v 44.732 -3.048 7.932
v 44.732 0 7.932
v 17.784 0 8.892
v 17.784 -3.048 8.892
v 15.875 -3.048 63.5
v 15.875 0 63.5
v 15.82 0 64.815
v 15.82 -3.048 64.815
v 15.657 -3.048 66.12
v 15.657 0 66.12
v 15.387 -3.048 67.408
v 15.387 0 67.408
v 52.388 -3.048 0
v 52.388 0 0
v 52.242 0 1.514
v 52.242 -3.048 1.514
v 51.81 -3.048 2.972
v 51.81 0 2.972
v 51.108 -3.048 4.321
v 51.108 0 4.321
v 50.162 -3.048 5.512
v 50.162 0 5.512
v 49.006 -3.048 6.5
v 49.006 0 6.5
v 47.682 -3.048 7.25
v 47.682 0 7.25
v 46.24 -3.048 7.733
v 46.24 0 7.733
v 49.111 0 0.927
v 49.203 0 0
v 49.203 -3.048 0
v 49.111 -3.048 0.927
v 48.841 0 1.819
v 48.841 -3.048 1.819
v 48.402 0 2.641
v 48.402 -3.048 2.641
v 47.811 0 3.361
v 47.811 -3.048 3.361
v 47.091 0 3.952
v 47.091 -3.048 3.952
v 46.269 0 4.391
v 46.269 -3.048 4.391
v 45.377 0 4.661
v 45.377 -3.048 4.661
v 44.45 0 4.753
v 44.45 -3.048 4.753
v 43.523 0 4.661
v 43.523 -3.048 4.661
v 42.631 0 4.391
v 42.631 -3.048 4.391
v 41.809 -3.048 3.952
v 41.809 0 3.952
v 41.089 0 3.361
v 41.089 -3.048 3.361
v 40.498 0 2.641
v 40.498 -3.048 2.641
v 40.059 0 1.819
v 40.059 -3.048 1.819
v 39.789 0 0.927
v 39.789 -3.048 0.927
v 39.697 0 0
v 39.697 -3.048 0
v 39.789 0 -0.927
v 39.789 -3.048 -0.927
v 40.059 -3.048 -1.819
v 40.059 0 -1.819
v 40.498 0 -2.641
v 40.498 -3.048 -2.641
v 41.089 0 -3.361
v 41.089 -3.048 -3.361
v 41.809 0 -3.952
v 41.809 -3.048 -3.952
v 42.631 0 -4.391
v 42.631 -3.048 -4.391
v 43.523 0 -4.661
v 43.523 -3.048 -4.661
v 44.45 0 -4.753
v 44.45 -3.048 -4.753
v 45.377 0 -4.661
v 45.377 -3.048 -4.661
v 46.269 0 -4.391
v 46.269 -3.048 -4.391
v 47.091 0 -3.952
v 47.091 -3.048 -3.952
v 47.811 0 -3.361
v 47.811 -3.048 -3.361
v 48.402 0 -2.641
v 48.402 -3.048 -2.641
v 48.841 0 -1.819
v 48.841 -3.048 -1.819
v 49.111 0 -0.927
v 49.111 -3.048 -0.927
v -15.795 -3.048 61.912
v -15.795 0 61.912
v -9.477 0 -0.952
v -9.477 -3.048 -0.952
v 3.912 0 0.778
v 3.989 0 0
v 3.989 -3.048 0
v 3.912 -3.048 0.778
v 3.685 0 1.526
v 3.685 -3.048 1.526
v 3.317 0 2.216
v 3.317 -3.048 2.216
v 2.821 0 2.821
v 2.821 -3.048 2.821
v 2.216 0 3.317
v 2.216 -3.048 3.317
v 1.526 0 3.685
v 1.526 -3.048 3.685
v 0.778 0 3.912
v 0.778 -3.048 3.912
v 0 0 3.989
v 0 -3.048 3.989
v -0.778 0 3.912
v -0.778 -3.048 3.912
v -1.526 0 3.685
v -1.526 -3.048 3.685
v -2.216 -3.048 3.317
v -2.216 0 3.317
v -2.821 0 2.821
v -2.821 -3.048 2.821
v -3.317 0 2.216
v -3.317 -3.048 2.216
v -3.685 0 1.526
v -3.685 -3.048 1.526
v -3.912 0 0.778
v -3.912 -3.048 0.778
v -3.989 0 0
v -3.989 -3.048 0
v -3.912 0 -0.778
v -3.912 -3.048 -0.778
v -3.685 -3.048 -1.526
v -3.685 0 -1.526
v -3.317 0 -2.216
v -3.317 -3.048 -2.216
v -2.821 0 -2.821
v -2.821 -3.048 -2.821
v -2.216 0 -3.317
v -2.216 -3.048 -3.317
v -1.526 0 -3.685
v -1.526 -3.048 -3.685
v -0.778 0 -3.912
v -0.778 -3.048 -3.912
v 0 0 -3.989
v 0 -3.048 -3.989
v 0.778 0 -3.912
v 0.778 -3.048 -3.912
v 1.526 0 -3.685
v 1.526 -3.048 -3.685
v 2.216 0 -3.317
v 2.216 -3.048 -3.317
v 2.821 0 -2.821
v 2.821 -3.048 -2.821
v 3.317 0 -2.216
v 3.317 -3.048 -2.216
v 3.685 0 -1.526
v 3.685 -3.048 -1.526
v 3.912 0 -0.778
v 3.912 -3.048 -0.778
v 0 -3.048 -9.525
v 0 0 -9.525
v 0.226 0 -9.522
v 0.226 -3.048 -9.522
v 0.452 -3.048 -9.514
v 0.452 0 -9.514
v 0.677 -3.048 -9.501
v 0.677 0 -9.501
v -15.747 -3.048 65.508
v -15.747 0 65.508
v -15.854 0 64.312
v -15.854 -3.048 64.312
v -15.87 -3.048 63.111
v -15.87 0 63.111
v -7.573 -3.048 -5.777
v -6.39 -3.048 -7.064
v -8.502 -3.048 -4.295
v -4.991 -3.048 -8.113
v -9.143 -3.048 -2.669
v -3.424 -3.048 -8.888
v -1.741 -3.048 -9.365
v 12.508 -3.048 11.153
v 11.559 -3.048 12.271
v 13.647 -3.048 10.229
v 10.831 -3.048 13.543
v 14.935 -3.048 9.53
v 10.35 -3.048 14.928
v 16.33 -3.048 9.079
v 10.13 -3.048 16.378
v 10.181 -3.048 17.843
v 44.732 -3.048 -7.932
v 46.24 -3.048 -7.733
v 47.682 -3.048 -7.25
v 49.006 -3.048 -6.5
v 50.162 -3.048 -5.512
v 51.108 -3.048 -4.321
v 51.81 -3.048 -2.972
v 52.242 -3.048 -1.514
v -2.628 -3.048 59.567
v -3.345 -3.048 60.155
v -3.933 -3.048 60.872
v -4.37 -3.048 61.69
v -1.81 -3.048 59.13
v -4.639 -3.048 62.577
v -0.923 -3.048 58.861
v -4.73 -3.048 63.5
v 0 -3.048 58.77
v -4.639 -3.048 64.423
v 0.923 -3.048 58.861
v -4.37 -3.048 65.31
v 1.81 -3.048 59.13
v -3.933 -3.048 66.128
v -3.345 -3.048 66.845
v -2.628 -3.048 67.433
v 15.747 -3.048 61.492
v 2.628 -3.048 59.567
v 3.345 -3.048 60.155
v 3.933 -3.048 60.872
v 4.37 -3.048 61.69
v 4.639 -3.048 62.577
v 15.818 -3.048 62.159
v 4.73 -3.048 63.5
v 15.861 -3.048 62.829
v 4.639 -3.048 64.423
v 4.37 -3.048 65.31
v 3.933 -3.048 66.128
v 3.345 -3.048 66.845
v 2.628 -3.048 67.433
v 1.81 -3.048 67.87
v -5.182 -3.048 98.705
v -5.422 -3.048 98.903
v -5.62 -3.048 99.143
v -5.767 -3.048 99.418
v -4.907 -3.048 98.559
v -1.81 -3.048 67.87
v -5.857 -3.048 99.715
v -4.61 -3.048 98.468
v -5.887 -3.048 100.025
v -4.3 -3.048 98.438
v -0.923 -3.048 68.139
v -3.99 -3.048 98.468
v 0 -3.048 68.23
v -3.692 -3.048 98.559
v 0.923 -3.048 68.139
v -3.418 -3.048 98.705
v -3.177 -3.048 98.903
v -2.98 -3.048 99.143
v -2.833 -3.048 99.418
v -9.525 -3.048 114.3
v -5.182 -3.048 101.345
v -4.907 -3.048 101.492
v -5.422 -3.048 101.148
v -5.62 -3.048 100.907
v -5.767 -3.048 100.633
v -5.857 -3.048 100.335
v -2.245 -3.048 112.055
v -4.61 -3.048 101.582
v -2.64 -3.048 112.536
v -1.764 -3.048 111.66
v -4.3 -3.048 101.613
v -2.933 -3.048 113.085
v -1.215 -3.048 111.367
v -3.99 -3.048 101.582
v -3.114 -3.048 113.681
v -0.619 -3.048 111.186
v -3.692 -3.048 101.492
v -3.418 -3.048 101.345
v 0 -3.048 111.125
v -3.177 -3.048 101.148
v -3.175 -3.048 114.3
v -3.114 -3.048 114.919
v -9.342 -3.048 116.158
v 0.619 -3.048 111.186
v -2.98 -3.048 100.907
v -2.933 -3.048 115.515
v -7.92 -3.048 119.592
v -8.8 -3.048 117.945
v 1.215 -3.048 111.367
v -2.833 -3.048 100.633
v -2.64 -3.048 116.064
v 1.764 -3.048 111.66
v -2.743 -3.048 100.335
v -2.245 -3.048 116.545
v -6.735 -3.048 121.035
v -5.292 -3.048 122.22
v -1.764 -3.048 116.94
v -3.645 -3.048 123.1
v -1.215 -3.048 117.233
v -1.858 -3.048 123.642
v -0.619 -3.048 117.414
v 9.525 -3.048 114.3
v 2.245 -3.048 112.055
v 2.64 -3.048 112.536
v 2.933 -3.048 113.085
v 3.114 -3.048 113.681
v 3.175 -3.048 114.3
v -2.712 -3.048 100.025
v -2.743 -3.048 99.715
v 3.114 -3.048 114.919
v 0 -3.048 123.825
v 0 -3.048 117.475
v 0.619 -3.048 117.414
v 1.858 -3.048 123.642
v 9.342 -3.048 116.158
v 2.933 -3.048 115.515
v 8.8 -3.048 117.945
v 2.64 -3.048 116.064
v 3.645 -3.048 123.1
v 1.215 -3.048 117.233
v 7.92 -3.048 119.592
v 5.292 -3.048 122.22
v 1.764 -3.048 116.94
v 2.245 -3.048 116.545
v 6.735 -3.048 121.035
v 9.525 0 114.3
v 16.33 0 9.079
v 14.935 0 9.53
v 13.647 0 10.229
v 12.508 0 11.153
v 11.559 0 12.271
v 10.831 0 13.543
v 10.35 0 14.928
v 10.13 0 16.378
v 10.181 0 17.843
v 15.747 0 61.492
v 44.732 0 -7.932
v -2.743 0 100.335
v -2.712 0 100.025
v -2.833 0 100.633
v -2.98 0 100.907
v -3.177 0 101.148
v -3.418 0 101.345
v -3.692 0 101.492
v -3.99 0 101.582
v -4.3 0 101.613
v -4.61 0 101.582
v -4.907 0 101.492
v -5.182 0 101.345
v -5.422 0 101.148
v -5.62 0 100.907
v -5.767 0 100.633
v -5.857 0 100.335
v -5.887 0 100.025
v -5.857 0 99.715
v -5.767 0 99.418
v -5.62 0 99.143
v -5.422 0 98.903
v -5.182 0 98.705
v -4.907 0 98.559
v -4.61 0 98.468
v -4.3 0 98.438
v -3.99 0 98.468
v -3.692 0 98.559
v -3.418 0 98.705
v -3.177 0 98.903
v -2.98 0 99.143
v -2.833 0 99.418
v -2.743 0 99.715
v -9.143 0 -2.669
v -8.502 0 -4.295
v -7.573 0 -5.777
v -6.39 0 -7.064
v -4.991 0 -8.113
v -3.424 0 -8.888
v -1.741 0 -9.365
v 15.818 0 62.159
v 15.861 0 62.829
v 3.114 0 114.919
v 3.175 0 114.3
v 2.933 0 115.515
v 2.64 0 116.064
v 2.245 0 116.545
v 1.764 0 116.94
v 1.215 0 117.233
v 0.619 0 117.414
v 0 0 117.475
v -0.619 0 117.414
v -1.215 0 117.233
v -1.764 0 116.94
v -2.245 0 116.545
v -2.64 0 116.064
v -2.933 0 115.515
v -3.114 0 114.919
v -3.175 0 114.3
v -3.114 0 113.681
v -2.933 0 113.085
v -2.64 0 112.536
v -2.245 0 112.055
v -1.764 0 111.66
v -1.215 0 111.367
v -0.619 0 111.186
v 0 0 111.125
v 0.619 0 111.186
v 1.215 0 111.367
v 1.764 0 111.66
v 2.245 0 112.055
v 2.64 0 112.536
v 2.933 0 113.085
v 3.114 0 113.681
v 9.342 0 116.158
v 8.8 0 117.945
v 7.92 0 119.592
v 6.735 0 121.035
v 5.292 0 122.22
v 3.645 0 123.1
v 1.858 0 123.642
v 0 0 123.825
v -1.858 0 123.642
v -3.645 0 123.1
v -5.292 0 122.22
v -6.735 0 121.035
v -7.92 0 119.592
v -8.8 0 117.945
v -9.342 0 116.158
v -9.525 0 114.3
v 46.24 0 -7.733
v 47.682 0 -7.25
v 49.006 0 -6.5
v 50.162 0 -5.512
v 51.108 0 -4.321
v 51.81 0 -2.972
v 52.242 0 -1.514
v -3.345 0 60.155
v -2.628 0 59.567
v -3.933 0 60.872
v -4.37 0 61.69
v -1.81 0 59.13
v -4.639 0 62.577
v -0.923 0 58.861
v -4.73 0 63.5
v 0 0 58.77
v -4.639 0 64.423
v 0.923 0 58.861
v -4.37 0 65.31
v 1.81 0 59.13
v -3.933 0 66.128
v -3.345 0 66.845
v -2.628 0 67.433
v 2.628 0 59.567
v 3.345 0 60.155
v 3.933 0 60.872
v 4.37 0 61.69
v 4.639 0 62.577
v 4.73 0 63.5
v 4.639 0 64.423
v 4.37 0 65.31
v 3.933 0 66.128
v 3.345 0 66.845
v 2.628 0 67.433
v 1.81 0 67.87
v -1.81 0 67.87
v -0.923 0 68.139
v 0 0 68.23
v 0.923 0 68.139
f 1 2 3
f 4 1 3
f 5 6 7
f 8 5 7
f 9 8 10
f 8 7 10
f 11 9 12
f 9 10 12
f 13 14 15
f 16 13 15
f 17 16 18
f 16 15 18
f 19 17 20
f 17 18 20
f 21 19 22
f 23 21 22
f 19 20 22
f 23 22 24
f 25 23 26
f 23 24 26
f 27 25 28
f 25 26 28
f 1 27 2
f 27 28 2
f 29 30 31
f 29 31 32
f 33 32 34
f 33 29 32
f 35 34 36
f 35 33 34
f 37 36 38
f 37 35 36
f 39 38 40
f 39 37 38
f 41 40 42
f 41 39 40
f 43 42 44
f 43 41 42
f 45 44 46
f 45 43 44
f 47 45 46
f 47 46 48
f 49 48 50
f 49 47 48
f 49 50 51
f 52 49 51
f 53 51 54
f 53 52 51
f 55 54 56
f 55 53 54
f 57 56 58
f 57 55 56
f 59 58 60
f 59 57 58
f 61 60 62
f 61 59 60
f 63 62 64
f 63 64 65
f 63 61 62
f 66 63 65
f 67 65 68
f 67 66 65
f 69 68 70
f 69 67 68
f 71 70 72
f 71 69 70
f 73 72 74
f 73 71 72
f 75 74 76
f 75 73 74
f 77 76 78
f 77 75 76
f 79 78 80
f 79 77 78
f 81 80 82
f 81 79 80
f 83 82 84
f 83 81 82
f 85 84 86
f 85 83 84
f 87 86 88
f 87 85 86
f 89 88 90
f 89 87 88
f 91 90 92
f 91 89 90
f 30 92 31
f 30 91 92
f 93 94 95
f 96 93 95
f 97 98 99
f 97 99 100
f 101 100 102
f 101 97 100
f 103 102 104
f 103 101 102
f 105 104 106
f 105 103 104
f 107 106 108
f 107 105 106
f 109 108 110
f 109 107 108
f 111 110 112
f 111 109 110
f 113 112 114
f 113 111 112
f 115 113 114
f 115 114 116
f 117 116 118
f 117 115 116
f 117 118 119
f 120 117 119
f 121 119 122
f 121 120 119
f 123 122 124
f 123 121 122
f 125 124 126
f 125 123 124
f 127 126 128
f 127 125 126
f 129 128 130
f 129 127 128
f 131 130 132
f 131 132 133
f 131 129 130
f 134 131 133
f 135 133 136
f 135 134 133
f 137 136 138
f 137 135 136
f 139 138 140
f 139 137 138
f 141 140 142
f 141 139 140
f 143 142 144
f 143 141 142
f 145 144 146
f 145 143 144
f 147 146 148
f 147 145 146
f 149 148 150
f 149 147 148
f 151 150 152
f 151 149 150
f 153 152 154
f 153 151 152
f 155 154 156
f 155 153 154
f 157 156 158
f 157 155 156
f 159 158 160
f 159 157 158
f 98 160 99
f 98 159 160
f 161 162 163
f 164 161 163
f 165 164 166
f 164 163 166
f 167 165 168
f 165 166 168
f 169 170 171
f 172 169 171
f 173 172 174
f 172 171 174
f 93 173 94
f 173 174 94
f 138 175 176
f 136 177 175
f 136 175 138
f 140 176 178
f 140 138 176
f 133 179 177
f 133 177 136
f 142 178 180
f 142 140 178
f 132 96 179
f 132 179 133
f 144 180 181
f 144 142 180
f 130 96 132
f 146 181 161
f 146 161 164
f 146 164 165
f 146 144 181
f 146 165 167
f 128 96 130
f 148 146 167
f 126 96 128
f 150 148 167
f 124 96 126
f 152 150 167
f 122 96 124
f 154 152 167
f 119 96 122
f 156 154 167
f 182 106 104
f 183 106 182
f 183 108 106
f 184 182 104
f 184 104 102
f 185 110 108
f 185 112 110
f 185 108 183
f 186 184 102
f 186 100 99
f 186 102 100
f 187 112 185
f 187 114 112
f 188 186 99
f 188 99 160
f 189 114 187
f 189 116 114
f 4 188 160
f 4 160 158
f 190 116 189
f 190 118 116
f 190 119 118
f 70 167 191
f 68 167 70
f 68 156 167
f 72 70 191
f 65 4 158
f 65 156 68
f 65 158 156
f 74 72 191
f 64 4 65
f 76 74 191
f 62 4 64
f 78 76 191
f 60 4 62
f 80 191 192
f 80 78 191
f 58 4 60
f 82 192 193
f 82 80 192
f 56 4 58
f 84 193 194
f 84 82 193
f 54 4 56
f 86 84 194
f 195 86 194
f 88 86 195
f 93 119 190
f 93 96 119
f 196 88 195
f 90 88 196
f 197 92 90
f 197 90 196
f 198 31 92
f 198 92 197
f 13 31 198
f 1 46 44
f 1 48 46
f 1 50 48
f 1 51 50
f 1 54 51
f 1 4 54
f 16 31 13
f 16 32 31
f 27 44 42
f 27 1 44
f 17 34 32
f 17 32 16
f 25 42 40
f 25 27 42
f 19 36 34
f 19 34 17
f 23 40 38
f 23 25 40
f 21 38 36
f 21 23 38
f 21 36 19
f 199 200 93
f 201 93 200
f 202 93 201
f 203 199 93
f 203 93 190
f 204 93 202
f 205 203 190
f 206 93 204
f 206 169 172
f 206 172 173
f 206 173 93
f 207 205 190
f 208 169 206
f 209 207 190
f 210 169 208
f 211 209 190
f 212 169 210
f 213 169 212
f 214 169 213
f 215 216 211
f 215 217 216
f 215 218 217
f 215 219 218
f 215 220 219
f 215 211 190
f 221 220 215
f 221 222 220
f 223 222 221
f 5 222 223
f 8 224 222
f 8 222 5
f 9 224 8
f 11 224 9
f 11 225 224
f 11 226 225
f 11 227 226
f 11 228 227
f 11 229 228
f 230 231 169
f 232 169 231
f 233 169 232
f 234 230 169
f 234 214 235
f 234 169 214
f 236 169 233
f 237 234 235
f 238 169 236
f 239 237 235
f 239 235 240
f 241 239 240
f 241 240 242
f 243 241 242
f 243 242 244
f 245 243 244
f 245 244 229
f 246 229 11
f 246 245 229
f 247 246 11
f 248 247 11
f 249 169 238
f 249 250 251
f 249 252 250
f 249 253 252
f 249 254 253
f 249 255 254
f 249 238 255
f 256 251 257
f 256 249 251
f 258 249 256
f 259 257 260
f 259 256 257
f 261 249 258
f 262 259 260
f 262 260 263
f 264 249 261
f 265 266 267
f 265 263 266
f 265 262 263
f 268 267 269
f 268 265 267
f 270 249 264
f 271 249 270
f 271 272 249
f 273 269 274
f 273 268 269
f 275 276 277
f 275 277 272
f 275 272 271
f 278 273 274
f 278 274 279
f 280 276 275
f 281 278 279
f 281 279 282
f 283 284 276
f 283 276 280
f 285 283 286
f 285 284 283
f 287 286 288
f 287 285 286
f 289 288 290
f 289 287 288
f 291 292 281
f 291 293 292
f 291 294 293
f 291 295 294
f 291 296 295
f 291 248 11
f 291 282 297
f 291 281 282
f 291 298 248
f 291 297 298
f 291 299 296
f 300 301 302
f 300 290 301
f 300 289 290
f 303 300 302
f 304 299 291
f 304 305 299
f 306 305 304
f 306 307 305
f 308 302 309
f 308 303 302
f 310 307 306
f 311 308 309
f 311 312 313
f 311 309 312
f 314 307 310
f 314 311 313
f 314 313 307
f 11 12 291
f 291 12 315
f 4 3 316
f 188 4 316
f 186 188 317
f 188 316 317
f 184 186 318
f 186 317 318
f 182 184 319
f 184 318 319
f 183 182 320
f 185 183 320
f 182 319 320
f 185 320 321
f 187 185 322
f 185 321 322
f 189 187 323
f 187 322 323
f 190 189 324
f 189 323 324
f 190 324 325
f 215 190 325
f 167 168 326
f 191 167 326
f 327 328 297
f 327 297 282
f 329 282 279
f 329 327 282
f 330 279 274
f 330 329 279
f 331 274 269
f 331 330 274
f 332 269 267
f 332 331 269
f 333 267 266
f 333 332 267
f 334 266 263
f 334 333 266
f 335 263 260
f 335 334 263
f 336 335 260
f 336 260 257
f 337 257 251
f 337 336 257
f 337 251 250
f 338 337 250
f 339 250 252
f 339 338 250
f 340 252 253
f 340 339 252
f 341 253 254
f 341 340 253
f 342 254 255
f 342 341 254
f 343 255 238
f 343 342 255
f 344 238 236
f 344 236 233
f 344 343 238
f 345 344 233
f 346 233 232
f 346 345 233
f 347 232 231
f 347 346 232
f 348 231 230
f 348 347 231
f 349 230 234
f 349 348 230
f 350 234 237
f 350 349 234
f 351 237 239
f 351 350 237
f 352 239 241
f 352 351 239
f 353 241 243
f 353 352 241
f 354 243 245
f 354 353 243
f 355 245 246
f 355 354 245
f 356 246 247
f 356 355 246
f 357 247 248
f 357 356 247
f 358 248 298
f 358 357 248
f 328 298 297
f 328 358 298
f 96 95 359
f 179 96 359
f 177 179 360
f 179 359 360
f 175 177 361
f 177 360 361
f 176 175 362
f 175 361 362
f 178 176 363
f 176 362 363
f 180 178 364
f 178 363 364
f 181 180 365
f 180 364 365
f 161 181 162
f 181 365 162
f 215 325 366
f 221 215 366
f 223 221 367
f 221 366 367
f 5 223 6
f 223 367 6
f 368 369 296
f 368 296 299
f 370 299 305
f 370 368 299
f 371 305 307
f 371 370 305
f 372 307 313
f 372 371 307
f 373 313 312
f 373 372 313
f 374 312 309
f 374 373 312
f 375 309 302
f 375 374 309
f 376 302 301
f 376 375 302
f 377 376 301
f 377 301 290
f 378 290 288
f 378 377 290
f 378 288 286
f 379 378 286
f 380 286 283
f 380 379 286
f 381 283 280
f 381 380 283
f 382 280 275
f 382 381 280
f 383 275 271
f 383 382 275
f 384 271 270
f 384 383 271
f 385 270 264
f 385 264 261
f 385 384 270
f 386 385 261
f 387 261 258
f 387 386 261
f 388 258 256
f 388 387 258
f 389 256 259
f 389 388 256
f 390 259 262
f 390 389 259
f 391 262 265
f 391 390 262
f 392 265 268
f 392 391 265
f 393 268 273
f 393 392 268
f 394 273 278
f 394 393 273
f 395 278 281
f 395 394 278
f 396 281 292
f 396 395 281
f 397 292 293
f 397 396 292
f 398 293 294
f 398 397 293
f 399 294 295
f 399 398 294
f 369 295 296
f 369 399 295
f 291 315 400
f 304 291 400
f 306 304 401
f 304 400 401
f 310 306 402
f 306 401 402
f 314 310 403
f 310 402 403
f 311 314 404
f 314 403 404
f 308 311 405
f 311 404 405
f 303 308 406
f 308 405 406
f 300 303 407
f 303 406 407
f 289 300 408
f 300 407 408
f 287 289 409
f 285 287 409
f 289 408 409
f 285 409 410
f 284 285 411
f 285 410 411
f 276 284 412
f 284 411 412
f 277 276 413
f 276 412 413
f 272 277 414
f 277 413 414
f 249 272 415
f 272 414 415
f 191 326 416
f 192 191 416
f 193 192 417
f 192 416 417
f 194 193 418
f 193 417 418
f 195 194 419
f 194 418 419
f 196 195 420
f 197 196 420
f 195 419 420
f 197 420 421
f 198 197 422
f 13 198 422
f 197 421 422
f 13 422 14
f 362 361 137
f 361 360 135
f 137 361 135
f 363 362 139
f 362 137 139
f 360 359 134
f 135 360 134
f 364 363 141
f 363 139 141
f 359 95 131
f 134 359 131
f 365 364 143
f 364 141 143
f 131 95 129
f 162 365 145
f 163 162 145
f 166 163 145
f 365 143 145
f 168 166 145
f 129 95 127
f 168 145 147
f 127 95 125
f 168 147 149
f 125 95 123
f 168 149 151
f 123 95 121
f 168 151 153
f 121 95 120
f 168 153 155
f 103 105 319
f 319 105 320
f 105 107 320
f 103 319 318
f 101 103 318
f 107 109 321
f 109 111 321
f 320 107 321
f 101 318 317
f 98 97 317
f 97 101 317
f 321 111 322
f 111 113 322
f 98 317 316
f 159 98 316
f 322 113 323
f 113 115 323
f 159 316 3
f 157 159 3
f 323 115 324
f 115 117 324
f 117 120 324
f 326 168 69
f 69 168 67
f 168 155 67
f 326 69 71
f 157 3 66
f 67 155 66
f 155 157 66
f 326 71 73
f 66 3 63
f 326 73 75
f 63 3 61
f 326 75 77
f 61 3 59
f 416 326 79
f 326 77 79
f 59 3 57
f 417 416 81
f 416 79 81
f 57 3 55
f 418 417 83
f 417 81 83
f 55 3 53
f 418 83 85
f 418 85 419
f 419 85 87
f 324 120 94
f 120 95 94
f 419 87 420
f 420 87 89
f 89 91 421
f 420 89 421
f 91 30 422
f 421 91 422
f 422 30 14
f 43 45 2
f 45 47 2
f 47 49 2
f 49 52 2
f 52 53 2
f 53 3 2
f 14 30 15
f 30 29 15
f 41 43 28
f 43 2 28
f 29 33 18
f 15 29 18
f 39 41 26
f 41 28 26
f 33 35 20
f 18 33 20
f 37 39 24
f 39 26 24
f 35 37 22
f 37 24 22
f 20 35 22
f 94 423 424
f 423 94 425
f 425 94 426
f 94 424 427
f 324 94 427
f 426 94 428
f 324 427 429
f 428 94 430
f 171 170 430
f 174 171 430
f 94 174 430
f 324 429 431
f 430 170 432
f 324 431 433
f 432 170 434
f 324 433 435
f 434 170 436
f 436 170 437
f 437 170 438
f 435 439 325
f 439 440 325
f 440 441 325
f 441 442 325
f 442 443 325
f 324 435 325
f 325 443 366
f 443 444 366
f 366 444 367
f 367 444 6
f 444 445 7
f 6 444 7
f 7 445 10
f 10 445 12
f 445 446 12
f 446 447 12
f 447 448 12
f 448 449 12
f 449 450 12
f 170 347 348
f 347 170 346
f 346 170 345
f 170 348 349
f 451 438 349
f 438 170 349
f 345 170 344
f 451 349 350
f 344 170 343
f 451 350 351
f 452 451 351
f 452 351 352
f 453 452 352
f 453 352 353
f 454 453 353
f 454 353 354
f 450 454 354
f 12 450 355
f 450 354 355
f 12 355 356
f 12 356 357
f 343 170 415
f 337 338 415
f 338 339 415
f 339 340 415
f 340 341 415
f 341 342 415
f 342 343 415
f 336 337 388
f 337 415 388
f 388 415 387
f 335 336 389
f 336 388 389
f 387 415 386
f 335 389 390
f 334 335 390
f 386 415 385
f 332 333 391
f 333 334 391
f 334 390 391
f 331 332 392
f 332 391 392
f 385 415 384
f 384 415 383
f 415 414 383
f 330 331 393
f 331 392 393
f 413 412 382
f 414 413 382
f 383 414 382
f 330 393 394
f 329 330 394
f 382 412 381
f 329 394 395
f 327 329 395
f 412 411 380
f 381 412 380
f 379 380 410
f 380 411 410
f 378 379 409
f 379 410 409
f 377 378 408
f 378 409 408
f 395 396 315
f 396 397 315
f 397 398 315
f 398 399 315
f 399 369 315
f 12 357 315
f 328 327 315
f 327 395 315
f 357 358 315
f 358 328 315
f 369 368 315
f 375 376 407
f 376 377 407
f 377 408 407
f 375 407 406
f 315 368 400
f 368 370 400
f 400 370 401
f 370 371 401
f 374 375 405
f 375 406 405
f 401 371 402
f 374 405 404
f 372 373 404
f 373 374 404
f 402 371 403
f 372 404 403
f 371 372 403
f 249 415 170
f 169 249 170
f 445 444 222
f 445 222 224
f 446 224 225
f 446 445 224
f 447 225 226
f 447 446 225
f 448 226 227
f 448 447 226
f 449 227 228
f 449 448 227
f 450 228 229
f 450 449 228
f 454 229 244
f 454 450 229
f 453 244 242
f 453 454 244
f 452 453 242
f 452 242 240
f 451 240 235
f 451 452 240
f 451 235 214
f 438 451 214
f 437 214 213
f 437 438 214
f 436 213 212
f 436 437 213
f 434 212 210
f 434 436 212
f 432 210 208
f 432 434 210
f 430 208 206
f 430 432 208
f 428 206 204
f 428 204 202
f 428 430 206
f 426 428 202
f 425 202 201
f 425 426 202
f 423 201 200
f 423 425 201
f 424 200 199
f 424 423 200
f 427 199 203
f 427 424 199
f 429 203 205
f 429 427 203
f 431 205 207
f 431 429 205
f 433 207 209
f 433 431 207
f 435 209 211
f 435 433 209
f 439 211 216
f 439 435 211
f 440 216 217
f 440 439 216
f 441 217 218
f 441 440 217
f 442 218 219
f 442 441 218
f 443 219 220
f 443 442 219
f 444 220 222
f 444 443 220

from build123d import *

# Parameters (mm, degrees)
F0_R     = 3.175
F0_R_2   = 1.5875
F0_R_3   = 4.729967
F0_R_4   = 3.988899
F0_R_5   = 4.752778
F1_DEPTH = 3.048


with BuildPart() as f1:
    # F0 (on Front) → F1 (new body)
    with BuildSketch(Plane.XZ):
        with BuildLine():
            ThreePointArc((-9.525, 114.3), (0, 104.775), (9.525, 114.3))
            ThreePointArc((9.525, 114.3), (0, 123.825), (-9.525, 114.3))
        make_face()
        with Locations((0, 114.3)):
            Circle(F0_R, mode=Mode.SUBTRACT)
        with BuildLine():
            Line((15.386538, 67.407692), (9.525, 114.3))
            ThreePointArc((9.525, 114.3), (0, 104.775), (-9.525, 114.3))
            Line((-9.525, 114.3), (-15.747457, 65.508289))
            ThreePointArc((-15.747457, 65.508289), (-0.966695, 79.34554), (15.386538, 67.407692))
        make_face()
        with Locations((-4.299854, 100.0252)):
            Circle(F0_R_2, mode=Mode.SUBTRACT)
        with BuildLine():
            Line((15.875, 63.5), (15.386538, 67.407692))
            ThreePointArc((15.386538, 67.407692), (-0.966695, 79.34554), (-15.747457, 65.508289))
            ThreePointArc((-15.747457, 65.508289), (-15.873588, 63.711757), (-15.795426, 61.9125))
            ThreePointArc((-15.795426, 61.9125), (-0.211757, 47.626412), (15.747457, 61.491711))
            ThreePointArc((15.747457, 61.491711), (15.843082, 62.493832), (15.875, 63.5))
        make_face()
        with Locations((0, 63.5)):
            Circle(F0_R_3, mode=Mode.SUBTRACT)
        with BuildLine():
            ThreePointArc((15.875, 63.5), (15.752411, 65.469051), (15.386538, 67.407692))
            Line((15.386538, 67.407692), (15.875, 63.5))
        make_face()
        with BuildLine():
            ThreePointArc((15.747457, 61.491711), (-0.211757, 47.626412), (-15.795426, 61.9125))
            Line((-15.795426, 61.9125), (-9.477255, -0.9525))
            ThreePointArc((-9.477255, -0.9525), (-0.476848, 9.513056), (9.525, 0))
            ThreePointArc((9.525, 0), (6.970557, -6.491299), (0.677344, -9.500886))
            Line((0.677344, -9.500886), (44.732405, -7.932475))
            ThreePointArc((44.732405, -7.932475), (36.5125, 0), (44.732405, 7.932475))
            Line((44.732405, 7.932475), (17.784333, 8.891857))
            ThreePointArc((17.784333, 8.891857), (12.008013, 11.68998), (10.180863, 17.842775))
            Line((10.180863, 17.842775), (15.747457, 61.491711))
        make_face()
        with BuildLine():
            ThreePointArc((9.525, 0), (-0.476848, 9.513056), (-9.477255, -0.9525))
            ThreePointArc((-9.477255, -0.9525), (-6.389564, -7.063929), (0, -9.525))
            Line((0, -9.525), (0.677344, -9.500886))
            ThreePointArc((0.677344, -9.500886), (6.970557, -6.491299), (9.525, 0))
        make_face()
        Circle(F0_R_4, mode=Mode.SUBTRACT)
        with BuildLine():
            Line((0.677344, -9.500886), (0, -9.525))
            ThreePointArc((0, -9.525), (0.338886, -9.51897), (0.677344, -9.500886))
        make_face()
        with BuildLine():
            ThreePointArc((52.3875, 0), (50.161633, 5.51191), (44.732405, 7.932475))
            ThreePointArc((44.732405, 7.932475), (36.5125, 0), (44.732405, -7.932475))
            ThreePointArc((44.732405, -7.932475), (50.161633, -5.51191), (52.3875, 0))
        make_face()
        with Locations((44.45, 0)):
            Circle(F0_R_5, mode=Mode.SUBTRACT)
    extrude(amount=F1_DEPTH)


solid = f1.part
